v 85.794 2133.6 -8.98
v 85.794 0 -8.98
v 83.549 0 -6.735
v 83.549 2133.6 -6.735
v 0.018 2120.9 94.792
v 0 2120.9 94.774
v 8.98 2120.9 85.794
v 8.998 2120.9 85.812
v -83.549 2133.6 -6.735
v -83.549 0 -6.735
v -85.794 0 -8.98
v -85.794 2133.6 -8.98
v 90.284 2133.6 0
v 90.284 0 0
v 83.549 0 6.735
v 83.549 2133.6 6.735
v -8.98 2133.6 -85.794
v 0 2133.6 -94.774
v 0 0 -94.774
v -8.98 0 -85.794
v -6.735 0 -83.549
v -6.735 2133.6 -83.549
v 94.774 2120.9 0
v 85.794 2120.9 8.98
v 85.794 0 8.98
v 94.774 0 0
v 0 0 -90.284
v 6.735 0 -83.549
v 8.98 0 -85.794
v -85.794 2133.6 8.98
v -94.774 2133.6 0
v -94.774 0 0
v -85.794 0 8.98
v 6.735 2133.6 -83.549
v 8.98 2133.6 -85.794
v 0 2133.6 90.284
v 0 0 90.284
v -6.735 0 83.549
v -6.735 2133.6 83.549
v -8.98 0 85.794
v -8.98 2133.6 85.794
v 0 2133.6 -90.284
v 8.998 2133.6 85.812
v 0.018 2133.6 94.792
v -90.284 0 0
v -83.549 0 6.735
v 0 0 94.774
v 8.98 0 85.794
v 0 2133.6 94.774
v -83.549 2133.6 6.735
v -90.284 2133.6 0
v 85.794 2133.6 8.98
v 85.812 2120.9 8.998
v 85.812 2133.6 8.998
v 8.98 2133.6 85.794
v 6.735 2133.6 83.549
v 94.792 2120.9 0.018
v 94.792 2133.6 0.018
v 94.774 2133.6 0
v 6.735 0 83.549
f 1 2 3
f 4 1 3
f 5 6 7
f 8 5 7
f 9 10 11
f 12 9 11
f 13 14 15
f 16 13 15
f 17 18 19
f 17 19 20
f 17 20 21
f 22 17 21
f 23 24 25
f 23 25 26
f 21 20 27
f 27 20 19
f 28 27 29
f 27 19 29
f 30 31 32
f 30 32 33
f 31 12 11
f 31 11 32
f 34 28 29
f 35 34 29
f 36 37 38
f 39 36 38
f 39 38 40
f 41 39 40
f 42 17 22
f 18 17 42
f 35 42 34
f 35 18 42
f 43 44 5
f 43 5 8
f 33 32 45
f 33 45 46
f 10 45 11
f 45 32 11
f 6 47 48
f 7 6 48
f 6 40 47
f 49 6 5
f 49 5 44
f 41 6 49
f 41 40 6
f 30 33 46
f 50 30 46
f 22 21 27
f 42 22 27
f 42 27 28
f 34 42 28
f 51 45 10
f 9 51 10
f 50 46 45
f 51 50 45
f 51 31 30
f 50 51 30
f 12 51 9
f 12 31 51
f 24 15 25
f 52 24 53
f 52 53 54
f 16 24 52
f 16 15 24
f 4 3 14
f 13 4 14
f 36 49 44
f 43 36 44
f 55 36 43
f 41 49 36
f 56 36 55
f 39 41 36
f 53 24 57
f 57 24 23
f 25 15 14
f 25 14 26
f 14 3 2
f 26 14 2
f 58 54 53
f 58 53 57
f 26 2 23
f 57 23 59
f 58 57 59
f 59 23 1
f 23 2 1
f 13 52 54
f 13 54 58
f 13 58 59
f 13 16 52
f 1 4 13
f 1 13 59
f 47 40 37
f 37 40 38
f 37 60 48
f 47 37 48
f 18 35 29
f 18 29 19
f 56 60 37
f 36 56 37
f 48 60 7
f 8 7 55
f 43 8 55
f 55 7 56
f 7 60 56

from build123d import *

# Parameters (mm, degrees)
BOSS_EXTRUDE1_DEPTH   = 2133.6
BOSS_EXTRUDE1_2_DEPTH = 2133.6
BOSS_EXTRUDE1_3_DEPTH = 2133.6
BOSS_EXTRUDE1_4_DEPTH = 2133.6
SKETCH3_W             = 12.7
SKETCH3_H             = 12.7
BOSS_EXTRUDE2_DEPTH   = 0.0254
SKETCH4_W             = 12.7
SKETCH4_H             = 12.7
BOSS_EXTRUDE3_DEPTH   = 0.0254


with BuildPart() as part:
    # Sketch2 → Boss-Extrude1 (new body)
    with BuildSketch(Plane(origin=(0, 0, 0), x_dir=(1, 0, 0), z_dir=(0, 1, 0))):
        Polygon((0, 94.77428536), (-8.980256121, 85.794029239), (-6.735192091, 83.548965209), (0, 90.2841573), (6.735192091, 83.548965209), (8.980256121, 85.794029239), align=None)
    extrude(amount=BOSS_EXTRUDE1_DEPTH)


with BuildPart() as body_2:
    # Sketch2 → Boss-Extrude1 2 (new body)
    with BuildSketch(Plane(origin=(0, 0, 0), x_dir=(1, 0, 0), z_dir=(0, 1, 0))):
        Polygon((94.77428536, 0), (85.794029239, 8.980256121), (83.548965209, 6.735192091), (90.2841573, 0), (83.548965209, -6.735192091), (85.794029239, -8.980256121), align=None)
    extrude(amount=BOSS_EXTRUDE1_2_DEPTH)

    # Sketch4 → Boss-Extrude3 (add)
    with BuildSketch(Plane(origin=(47.38714268, 0, 47.38714268), x_dir=(0.707106781, 0, -0.707106781), z_dir=(0.707106781, 0, 0.707106781))):
        with Locations((60.66553986, 2127.25)):
            Rectangle(SKETCH4_W, SKETCH4_H)
    extrude(amount=BOSS_EXTRUDE3_DEPTH)


with BuildPart() as body_3:
    # Sketch2 → Boss-Extrude1 3 (new body)
    with BuildSketch(Plane(origin=(0, 0, 0), x_dir=(1, 0, 0), z_dir=(0, 1, 0))):
        Polygon((0, -94.77428536), (8.980256121, -85.794029239), (6.735192091, -83.548965209), (0, -90.2841573), (-6.735192091, -83.548965209), (-8.980256121, -85.794029239), align=None)
    extrude(amount=BOSS_EXTRUDE1_3_DEPTH)

    # Sketch3 → Boss-Extrude2 (add)
    with BuildSketch(Plane(origin=(47.38714268, 0, 47.38714268), x_dir=(0.707106781, 0, -0.707106781), z_dir=(0.707106781, 0, 0.707106781))):
        with Locations((-60.66553986, 2127.25)):
            Rectangle(SKETCH3_W, SKETCH3_H)
    extrude(amount=BOSS_EXTRUDE2_DEPTH)


with BuildPart() as body_4:
    # Sketch2 → Boss-Extrude1 4 (new body)
    with BuildSketch(Plane(origin=(0, 0, 0), x_dir=(1, 0, 0), z_dir=(0, 1, 0))):
        Polygon((-94.77428536, 0), (-85.794029239, -8.980256121), (-83.548965209, -6.735192091), (-90.2841573, 0), (-83.548965209, 6.735192091), (-85.794029239, 8.980256121), align=None)
    extrude(amount=BOSS_EXTRUDE1_4_DEPTH)


solid = Compound([part.part, body_2.part, body_3.part, body_4.part])
